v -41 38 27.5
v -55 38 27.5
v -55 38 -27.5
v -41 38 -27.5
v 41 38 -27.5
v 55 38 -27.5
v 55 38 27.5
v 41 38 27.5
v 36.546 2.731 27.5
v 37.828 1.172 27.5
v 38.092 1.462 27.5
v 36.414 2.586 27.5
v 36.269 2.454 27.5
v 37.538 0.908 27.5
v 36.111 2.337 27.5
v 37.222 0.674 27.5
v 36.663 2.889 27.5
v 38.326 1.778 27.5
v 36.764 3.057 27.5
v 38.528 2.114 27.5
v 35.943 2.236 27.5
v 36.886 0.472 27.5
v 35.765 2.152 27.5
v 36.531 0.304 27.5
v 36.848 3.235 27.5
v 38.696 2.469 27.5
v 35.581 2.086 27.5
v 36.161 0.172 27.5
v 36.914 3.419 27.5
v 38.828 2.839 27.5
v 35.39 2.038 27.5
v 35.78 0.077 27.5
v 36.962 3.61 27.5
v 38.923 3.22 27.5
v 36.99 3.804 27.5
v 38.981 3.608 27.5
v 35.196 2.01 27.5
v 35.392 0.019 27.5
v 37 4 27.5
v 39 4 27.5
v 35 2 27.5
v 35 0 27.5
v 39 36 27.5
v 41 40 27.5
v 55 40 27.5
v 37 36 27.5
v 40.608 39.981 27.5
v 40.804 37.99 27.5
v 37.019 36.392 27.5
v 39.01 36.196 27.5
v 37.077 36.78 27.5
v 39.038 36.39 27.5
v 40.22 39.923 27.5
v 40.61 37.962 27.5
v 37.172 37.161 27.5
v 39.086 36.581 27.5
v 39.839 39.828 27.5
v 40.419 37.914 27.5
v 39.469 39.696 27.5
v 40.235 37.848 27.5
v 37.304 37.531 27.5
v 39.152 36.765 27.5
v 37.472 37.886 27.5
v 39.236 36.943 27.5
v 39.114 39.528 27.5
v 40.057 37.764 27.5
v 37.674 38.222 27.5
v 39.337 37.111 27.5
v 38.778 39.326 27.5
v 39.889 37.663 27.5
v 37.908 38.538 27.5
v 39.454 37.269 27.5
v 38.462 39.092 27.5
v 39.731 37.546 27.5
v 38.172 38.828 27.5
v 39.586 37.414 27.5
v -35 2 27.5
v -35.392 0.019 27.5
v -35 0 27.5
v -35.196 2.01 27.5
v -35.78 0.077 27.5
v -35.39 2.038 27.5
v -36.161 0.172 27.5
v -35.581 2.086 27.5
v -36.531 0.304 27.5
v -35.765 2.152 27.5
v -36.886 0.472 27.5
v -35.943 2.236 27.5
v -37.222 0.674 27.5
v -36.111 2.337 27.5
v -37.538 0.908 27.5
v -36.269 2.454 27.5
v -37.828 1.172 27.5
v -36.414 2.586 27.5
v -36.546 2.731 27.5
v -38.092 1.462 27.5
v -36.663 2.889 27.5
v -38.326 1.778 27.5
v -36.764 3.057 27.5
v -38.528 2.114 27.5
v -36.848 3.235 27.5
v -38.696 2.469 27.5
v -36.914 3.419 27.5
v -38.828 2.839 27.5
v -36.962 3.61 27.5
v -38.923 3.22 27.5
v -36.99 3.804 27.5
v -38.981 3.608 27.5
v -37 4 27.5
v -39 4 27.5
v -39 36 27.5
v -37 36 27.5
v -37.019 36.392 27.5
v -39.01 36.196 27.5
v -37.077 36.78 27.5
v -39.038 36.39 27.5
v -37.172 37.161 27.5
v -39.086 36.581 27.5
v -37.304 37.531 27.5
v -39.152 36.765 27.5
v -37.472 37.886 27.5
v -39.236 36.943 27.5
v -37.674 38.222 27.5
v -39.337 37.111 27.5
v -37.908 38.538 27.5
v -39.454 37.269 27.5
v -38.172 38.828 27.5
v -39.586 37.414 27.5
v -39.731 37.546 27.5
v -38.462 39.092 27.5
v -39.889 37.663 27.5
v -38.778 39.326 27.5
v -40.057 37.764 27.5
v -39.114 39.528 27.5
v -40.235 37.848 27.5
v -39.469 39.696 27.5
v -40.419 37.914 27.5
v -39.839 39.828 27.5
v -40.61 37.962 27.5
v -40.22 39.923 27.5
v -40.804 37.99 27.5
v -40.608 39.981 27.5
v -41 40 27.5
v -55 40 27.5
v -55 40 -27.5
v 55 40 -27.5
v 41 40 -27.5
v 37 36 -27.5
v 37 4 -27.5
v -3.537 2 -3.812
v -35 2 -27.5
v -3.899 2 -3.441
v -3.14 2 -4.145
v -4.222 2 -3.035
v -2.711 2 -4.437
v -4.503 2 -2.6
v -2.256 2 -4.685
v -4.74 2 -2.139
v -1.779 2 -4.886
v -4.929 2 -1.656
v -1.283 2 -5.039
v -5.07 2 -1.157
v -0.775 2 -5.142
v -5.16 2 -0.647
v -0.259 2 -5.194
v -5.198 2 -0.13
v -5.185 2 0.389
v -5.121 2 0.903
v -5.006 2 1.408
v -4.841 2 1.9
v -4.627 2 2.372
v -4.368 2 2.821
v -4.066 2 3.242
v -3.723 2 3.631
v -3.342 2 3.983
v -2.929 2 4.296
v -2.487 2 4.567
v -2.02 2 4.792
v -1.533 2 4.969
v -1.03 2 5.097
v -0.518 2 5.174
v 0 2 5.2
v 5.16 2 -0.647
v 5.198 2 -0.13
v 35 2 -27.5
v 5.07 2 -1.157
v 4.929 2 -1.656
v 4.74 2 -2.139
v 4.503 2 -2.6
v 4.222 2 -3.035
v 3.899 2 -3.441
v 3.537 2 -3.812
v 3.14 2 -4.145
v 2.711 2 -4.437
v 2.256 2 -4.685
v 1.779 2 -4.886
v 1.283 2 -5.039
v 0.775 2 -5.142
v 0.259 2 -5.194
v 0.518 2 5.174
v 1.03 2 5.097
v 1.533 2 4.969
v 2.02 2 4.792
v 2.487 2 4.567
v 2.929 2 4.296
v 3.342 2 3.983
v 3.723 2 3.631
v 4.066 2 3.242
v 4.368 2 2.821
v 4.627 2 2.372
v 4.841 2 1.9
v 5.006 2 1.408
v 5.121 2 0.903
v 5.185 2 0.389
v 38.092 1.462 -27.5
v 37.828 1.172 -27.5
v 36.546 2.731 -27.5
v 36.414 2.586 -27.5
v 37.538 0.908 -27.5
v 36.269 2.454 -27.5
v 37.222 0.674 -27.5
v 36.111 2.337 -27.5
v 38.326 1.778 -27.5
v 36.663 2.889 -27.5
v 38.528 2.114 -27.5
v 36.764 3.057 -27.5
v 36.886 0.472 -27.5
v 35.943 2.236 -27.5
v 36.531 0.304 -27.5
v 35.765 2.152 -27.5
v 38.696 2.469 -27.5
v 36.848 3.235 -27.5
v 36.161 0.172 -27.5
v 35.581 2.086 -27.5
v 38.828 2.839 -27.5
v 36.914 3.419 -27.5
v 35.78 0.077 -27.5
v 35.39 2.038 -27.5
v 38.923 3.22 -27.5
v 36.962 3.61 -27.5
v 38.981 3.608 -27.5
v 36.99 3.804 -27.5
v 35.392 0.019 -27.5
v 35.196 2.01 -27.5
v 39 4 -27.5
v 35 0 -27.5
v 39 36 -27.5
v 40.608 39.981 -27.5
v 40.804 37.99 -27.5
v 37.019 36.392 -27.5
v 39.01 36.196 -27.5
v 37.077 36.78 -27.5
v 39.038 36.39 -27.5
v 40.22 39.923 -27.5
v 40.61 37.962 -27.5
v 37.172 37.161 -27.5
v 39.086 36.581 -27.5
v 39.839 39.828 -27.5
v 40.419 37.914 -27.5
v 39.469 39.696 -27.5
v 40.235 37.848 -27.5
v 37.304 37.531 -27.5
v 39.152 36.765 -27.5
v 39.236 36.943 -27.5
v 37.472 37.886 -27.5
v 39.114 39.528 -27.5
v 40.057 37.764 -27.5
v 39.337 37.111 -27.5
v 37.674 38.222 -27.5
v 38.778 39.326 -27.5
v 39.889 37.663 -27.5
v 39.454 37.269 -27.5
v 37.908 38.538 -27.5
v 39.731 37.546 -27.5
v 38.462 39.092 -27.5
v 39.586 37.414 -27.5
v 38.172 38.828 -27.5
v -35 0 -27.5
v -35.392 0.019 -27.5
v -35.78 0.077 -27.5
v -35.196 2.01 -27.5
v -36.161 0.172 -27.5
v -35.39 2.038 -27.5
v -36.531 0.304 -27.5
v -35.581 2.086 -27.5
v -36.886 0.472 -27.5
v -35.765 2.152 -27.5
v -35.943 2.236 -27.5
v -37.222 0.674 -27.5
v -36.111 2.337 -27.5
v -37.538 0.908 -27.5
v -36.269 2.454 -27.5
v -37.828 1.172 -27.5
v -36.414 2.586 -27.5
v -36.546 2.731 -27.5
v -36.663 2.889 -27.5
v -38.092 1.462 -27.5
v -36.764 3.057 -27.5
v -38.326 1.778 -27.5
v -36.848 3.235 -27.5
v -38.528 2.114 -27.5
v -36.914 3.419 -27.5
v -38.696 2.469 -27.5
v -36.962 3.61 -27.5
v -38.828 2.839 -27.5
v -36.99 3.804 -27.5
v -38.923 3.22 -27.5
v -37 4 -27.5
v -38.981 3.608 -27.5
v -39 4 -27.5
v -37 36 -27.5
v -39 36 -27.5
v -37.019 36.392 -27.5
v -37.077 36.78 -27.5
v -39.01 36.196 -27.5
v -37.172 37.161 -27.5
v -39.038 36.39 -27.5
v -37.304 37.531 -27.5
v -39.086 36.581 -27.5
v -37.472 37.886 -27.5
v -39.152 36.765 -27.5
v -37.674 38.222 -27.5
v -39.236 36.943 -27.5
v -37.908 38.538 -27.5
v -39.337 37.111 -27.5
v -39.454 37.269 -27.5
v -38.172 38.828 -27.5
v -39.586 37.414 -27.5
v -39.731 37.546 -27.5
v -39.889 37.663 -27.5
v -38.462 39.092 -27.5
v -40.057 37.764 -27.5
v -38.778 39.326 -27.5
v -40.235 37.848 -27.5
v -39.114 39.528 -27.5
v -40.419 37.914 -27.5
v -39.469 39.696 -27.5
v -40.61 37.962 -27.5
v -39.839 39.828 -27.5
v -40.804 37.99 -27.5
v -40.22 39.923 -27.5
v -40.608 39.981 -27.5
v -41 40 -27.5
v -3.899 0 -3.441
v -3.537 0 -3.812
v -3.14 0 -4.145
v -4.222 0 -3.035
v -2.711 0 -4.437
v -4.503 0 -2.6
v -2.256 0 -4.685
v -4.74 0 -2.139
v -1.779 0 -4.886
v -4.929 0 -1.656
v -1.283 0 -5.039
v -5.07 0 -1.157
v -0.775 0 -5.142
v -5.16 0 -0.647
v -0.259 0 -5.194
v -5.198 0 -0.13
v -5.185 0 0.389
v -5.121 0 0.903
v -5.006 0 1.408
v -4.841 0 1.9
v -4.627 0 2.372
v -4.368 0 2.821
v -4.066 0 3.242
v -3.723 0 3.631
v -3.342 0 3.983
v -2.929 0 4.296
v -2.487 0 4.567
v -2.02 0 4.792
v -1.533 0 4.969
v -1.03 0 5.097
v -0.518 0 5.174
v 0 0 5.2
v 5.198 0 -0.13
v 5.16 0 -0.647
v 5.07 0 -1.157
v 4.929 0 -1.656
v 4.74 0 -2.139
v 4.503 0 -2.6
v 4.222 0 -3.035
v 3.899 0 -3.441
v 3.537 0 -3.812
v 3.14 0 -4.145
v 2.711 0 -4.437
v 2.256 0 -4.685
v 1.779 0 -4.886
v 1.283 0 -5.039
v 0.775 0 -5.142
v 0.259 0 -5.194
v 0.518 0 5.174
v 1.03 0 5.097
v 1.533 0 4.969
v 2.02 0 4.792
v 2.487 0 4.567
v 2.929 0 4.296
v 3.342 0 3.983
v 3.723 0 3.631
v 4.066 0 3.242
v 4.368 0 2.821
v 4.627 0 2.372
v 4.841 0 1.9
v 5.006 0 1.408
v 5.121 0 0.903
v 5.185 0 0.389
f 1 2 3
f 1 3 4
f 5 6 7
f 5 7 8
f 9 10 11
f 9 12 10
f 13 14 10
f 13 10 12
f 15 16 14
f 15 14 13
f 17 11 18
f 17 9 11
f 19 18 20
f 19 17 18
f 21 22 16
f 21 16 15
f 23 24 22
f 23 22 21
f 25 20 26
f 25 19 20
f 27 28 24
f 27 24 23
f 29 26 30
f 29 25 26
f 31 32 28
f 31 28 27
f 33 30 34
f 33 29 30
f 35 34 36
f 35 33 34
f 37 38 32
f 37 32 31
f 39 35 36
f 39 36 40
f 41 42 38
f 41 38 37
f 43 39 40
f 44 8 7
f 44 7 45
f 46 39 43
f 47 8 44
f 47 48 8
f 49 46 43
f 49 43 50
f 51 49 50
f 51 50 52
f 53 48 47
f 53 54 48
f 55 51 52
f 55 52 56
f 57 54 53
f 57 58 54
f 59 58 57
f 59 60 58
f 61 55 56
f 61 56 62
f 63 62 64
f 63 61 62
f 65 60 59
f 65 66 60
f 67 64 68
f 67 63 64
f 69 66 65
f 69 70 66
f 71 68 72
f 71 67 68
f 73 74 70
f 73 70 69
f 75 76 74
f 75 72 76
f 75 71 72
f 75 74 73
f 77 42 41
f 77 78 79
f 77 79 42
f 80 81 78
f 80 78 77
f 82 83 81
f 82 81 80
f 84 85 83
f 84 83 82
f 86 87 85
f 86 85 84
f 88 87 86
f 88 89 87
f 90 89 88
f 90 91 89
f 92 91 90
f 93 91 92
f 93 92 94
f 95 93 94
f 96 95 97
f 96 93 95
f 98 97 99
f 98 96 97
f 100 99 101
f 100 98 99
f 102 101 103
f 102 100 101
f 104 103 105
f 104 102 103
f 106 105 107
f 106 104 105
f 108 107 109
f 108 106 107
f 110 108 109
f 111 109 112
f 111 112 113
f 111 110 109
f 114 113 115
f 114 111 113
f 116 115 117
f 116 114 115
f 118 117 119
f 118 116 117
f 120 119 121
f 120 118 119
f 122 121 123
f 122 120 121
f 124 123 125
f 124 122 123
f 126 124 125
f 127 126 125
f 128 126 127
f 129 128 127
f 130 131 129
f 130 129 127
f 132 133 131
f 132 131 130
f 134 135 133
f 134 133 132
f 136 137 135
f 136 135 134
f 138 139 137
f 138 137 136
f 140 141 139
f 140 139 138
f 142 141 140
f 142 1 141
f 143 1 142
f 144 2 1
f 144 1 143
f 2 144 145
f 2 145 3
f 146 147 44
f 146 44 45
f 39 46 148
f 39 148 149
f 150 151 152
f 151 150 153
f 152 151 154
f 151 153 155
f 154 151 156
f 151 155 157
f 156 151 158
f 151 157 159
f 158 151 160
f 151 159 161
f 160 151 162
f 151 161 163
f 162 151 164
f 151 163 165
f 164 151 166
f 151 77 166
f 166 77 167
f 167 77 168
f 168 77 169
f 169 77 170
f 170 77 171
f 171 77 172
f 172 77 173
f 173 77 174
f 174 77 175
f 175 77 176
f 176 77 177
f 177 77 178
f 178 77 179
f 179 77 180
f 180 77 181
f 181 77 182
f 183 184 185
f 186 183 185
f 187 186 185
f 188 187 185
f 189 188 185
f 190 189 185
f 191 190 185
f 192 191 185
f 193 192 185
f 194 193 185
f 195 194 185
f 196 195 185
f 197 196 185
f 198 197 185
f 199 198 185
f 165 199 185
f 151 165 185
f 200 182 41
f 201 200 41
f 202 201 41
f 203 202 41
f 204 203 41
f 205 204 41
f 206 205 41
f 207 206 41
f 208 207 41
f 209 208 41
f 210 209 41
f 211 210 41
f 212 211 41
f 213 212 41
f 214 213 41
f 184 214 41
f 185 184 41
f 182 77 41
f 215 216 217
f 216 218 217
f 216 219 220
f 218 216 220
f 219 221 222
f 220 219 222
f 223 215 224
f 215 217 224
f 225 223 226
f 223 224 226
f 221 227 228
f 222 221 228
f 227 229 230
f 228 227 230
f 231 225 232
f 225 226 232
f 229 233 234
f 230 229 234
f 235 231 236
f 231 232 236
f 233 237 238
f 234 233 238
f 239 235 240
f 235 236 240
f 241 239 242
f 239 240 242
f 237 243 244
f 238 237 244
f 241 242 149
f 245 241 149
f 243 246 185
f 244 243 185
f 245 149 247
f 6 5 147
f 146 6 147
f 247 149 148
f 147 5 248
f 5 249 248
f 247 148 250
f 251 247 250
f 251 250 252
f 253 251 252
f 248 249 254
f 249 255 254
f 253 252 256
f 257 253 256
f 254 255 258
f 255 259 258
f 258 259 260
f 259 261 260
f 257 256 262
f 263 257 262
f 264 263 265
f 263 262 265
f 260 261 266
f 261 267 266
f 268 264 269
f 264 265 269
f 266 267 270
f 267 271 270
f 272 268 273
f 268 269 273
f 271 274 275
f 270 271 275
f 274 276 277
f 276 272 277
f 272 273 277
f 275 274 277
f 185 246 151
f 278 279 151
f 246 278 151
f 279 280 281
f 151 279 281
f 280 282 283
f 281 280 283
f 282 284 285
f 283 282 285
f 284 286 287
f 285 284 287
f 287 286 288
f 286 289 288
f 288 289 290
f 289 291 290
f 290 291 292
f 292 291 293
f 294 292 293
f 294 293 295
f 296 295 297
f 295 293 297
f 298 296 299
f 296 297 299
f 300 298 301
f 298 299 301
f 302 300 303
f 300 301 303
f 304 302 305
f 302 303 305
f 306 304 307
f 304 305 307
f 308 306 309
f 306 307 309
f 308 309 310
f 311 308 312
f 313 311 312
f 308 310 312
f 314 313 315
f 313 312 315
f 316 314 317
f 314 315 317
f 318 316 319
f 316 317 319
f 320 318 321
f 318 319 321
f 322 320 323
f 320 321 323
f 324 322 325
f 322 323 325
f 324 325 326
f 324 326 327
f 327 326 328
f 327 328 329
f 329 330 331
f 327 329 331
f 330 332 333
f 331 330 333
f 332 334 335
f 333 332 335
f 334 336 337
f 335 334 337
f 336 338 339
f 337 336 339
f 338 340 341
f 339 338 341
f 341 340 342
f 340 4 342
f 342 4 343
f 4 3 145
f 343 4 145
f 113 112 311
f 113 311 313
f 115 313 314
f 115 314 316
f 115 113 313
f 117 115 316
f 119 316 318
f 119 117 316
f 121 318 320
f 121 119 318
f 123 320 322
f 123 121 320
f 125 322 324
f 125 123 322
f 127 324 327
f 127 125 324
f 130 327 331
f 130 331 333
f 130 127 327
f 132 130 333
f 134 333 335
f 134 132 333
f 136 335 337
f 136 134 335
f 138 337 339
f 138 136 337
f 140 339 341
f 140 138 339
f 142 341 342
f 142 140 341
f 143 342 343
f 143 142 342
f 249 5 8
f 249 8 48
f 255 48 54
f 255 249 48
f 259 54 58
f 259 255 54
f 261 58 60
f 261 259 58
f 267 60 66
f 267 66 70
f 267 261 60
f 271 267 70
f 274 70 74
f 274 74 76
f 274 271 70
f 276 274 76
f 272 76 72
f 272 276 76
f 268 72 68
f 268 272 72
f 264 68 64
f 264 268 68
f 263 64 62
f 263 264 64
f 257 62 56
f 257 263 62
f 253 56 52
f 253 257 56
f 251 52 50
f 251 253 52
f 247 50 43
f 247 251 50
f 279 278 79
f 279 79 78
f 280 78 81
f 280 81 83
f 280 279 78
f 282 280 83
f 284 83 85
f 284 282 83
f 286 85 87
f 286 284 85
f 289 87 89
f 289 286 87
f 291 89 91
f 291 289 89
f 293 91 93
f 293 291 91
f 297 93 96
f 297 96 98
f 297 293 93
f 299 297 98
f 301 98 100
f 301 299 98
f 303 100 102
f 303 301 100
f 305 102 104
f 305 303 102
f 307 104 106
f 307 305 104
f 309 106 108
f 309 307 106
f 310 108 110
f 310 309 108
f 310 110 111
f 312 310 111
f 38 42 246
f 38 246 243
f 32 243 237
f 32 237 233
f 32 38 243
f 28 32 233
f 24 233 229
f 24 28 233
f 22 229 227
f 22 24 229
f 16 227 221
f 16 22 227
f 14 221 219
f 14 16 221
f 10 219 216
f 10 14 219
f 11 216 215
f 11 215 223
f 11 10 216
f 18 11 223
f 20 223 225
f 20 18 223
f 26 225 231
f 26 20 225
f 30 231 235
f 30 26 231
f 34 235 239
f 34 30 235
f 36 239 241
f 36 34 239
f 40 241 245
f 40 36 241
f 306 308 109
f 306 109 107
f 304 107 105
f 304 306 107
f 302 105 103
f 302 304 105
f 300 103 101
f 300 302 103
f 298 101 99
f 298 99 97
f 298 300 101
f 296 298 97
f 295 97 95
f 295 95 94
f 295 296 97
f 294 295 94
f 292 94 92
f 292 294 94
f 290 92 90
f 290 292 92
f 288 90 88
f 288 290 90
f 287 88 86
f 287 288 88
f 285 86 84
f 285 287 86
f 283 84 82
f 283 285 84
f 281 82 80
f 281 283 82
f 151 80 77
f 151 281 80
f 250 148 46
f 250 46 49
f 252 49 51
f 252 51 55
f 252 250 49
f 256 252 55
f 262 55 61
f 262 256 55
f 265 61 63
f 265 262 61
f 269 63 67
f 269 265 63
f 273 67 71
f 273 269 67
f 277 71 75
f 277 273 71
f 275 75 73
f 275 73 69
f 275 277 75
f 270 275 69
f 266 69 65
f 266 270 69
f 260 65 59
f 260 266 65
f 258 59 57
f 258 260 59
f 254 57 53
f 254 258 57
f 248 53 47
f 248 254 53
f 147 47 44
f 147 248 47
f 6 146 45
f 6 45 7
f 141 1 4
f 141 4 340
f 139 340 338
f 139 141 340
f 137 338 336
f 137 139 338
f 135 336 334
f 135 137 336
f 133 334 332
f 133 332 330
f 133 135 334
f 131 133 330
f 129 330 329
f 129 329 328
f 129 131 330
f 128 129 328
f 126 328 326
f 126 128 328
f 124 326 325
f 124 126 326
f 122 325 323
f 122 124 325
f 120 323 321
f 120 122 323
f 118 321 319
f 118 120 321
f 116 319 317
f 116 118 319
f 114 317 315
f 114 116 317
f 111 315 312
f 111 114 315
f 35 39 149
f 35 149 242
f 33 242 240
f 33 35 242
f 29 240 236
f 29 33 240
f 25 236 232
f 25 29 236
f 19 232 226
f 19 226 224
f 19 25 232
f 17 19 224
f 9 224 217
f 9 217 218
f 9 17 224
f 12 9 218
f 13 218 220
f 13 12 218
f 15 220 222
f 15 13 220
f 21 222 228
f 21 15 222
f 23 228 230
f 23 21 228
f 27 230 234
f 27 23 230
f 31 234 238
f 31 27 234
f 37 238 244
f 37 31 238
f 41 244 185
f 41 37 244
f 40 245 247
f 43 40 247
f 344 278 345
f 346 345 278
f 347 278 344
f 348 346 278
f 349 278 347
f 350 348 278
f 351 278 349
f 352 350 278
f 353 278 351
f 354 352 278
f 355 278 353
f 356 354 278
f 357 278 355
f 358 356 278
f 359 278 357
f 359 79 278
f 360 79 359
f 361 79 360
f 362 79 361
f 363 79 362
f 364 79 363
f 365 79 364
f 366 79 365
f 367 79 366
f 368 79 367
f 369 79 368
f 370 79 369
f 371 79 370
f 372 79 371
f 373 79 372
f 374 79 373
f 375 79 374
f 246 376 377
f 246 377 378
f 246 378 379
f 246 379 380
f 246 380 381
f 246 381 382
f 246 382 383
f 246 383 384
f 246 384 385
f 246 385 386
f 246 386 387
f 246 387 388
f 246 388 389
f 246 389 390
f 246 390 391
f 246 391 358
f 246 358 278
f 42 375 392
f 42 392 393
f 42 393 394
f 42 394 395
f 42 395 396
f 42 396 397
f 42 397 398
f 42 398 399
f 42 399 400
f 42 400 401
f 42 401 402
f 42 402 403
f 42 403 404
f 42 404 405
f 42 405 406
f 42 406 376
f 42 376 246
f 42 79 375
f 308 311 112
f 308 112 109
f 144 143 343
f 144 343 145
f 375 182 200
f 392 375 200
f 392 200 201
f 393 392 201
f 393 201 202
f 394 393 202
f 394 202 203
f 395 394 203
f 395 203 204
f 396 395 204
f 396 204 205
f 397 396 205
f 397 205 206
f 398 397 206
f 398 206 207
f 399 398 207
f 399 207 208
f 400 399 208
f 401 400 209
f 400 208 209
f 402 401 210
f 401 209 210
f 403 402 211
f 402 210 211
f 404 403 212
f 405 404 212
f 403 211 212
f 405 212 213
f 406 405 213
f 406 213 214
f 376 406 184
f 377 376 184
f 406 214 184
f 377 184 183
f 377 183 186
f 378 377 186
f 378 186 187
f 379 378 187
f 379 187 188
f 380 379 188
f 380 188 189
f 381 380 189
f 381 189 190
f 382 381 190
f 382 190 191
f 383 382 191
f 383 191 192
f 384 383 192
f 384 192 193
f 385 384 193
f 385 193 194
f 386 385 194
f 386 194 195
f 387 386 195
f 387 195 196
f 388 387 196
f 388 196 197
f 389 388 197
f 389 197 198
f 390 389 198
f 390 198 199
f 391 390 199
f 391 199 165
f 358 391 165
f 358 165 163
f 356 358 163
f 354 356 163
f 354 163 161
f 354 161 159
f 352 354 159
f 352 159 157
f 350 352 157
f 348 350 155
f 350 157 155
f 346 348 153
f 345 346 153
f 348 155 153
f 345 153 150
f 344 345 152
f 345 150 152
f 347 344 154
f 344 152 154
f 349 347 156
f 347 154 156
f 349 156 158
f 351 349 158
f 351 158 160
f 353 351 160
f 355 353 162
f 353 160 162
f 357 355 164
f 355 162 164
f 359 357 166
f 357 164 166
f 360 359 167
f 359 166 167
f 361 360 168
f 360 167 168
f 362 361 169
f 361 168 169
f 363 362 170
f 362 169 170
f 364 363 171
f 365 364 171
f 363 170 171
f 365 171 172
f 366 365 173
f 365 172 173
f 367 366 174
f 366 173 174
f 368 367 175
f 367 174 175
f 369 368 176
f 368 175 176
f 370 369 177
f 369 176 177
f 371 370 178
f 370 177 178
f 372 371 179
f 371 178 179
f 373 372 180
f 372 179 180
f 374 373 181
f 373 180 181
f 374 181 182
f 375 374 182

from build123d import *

# Parameters (mm, degrees)
SKETCH1_W                      = 78
SKETCH1_H                      = 2
BASE_FLANGE1_DEPTH             = 27.5
EDGE_FLANGE1_STRIP_W           = 12
EDGE_FLANGE1_STRIP_H           = 2
EDGE_FLANGE1_STRIP_CUT_DEPTH   = 55
EDGE_FLANGE1_STRIP_2_W         = 12
EDGE_FLANGE1_STRIP_2_H         = 2
EDGE_FLANGE1_STRIP_CUT_2_DEPTH = 55
EDGE_FLANGE1_DEPTH             = 55
EDGE_FLANGE1_BEND_DEPTH        = 55
EDGE_FLANGE2_STRIP_W           = 12
EDGE_FLANGE2_STRIP_H           = 2
EDGE_FLANGE2_STRIP_CUT_DEPTH   = 55
EDGE_FLANGE2_STRIP_2_W         = 12
EDGE_FLANGE2_STRIP_2_H         = 2
EDGE_FLANGE2_STRIP_CUT_2_DEPTH = 55
EDGE_FLANGE2_DEPTH             = 55
EDGE_FLANGE2_BEND_DEPTH        = 55
SKETCH18_R                     = 5.2
CUT_EXTRUDE1_DEPTH             = 10


# Sheet-metal steps are written as plain solids
with BuildPart() as part:
    # Sketch1 → Base-Flange1 (new, symmetric)
    with BuildSketch(Plane.XY):
        with Locations((0, 1)):
            Rectangle(SKETCH1_W, SKETCH1_H)
    extrude(amount=BASE_FLANGE1_DEPTH, both=True)

    # Edge-Flange1 strip (across the edge) → Edge-Flange1 strip cut (cut)
    with BuildSketch(Plane(origin=(-39, 2, -27.5), x_dir=(1, 0, 0), z_dir=(0, 0, 1))):
        with Locations((-2, -1)):
            Rectangle(EDGE_FLANGE1_STRIP_W, EDGE_FLANGE1_STRIP_H)
    extrude(amount=EDGE_FLANGE1_STRIP_CUT_DEPTH, mode=Mode.SUBTRACT)

    # Edge-Flange1 strip 2 (across the edge) → Edge-Flange1 strip cut 2 (cut)
    with BuildSketch(Plane(origin=(39, 2, 27.5), x_dir=(-1, 0, 0), z_dir=(0, 0, -1))):
        with Locations((-2, -1)):
            Rectangle(EDGE_FLANGE1_STRIP_2_W, EDGE_FLANGE1_STRIP_2_H)
    extrude(amount=EDGE_FLANGE1_STRIP_CUT_2_DEPTH, mode=Mode.SUBTRACT)

    # Edge-Flange1 section (across the edge) → Edge-Flange1 (add)
    with BuildSketch(Plane(origin=(-39, 2, -27.5), x_dir=(1, 0, 0), z_dir=(0, 0, 1))):
        with BuildLine():
            Line((0, 2), (0, 38))
            Line((0, 38), (2, 38))
            Line((2, 38), (2, 2))
            ThreePointArc((2, 2), (2.585786438, 0.585786438), (4, 0))
            Line((4, 0), (4, -2))
            ThreePointArc((4, -2), (1.171572875, -0.828427125), (0, 2))
        make_face()
    extrude(amount=EDGE_FLANGE1_DEPTH)

    # Edge-Flange1 section 2 (across the edge) → Edge-Flange1 bend (add)
    with BuildSketch(Plane(origin=(39, 2, 27.5), x_dir=(-1, 0, 0), z_dir=(0, 0, -1))):
        with BuildLine():
            Line((0, 2), (0, 38))
            Line((0, 38), (2, 38))
            Line((2, 38), (2, 2))
            ThreePointArc((2, 2), (2.585786438, 0.585786438), (4, 0))
            Line((4, 0), (4, -2))
            ThreePointArc((4, -2), (1.171572875, -0.828427125), (0, 2))
        make_face()
    extrude(amount=EDGE_FLANGE1_BEND_DEPTH)

    # Edge-Flange2 strip (across the edge) → Edge-Flange2 strip cut (cut)
    with BuildSketch(Plane(origin=(39, 40, -27.5), x_dir=(0, -1, 0), z_dir=(0, 0, 1))):
        with Locations((-2, -1)):
            Rectangle(EDGE_FLANGE2_STRIP_W, EDGE_FLANGE2_STRIP_H)
    extrude(amount=EDGE_FLANGE2_STRIP_CUT_DEPTH, mode=Mode.SUBTRACT)

    # Edge-Flange2 strip 2 (across the edge) → Edge-Flange2 strip cut 2 (cut)
    with BuildSketch(Plane(origin=(-39, 40, 27.5), x_dir=(0, -1, 0), z_dir=(0, 0, -1))):
        with Locations((-2, -1)):
            Rectangle(EDGE_FLANGE2_STRIP_2_W, EDGE_FLANGE2_STRIP_2_H)
    extrude(amount=EDGE_FLANGE2_STRIP_CUT_2_DEPTH, mode=Mode.SUBTRACT)

    # Edge-Flange2 section (across the edge) → Edge-Flange2 (add)
    with BuildSketch(Plane(origin=(39, 40, -27.5), x_dir=(0, -1, 0), z_dir=(0, 0, 1))):
        with BuildLine():
            Line((0, 2), (0, 16))
            Line((0, 16), (2, 16))
            Line((2, 16), (2, 2))
            ThreePointArc((2, 2), (2.585786438, 0.585786438), (4, 0))
            Line((4, 0), (4, -2))
            ThreePointArc((4, -2), (1.171572875, -0.828427125), (0, 2))
        make_face()
    extrude(amount=EDGE_FLANGE2_DEPTH)

    # Edge-Flange2 section 2 (across the edge) → Edge-Flange2 bend (add)
    with BuildSketch(Plane(origin=(-39, 40, 27.5), x_dir=(0, -1, 0), z_dir=(0, 0, -1))):
        with BuildLine():
            Line((0, 2), (0, 16))
            Line((0, 16), (2, 16))
            Line((2, 16), (2, 2))
            ThreePointArc((2, 2), (2.585786438, 0.585786438), (4, 0))
            Line((4, 0), (4, -2))
            ThreePointArc((4, -2), (1.171572875, -0.828427125), (0, 2))
        make_face()
    extrude(amount=EDGE_FLANGE2_BEND_DEPTH)

    # Sketch18 → Cut-Extrude1 (cut)
    with BuildSketch(Plane(origin=(0, 2, 0), x_dir=(1, 0, 0), z_dir=(0, 1, 0))):
        with Locations(Location((0, 0, 0), (0, 0, 270))):
            Circle(SKETCH18_R)
    extrude(amount=-CUT_EXTRUDE1_DEPTH, mode=Mode.SUBTRACT)


solid = part.part
